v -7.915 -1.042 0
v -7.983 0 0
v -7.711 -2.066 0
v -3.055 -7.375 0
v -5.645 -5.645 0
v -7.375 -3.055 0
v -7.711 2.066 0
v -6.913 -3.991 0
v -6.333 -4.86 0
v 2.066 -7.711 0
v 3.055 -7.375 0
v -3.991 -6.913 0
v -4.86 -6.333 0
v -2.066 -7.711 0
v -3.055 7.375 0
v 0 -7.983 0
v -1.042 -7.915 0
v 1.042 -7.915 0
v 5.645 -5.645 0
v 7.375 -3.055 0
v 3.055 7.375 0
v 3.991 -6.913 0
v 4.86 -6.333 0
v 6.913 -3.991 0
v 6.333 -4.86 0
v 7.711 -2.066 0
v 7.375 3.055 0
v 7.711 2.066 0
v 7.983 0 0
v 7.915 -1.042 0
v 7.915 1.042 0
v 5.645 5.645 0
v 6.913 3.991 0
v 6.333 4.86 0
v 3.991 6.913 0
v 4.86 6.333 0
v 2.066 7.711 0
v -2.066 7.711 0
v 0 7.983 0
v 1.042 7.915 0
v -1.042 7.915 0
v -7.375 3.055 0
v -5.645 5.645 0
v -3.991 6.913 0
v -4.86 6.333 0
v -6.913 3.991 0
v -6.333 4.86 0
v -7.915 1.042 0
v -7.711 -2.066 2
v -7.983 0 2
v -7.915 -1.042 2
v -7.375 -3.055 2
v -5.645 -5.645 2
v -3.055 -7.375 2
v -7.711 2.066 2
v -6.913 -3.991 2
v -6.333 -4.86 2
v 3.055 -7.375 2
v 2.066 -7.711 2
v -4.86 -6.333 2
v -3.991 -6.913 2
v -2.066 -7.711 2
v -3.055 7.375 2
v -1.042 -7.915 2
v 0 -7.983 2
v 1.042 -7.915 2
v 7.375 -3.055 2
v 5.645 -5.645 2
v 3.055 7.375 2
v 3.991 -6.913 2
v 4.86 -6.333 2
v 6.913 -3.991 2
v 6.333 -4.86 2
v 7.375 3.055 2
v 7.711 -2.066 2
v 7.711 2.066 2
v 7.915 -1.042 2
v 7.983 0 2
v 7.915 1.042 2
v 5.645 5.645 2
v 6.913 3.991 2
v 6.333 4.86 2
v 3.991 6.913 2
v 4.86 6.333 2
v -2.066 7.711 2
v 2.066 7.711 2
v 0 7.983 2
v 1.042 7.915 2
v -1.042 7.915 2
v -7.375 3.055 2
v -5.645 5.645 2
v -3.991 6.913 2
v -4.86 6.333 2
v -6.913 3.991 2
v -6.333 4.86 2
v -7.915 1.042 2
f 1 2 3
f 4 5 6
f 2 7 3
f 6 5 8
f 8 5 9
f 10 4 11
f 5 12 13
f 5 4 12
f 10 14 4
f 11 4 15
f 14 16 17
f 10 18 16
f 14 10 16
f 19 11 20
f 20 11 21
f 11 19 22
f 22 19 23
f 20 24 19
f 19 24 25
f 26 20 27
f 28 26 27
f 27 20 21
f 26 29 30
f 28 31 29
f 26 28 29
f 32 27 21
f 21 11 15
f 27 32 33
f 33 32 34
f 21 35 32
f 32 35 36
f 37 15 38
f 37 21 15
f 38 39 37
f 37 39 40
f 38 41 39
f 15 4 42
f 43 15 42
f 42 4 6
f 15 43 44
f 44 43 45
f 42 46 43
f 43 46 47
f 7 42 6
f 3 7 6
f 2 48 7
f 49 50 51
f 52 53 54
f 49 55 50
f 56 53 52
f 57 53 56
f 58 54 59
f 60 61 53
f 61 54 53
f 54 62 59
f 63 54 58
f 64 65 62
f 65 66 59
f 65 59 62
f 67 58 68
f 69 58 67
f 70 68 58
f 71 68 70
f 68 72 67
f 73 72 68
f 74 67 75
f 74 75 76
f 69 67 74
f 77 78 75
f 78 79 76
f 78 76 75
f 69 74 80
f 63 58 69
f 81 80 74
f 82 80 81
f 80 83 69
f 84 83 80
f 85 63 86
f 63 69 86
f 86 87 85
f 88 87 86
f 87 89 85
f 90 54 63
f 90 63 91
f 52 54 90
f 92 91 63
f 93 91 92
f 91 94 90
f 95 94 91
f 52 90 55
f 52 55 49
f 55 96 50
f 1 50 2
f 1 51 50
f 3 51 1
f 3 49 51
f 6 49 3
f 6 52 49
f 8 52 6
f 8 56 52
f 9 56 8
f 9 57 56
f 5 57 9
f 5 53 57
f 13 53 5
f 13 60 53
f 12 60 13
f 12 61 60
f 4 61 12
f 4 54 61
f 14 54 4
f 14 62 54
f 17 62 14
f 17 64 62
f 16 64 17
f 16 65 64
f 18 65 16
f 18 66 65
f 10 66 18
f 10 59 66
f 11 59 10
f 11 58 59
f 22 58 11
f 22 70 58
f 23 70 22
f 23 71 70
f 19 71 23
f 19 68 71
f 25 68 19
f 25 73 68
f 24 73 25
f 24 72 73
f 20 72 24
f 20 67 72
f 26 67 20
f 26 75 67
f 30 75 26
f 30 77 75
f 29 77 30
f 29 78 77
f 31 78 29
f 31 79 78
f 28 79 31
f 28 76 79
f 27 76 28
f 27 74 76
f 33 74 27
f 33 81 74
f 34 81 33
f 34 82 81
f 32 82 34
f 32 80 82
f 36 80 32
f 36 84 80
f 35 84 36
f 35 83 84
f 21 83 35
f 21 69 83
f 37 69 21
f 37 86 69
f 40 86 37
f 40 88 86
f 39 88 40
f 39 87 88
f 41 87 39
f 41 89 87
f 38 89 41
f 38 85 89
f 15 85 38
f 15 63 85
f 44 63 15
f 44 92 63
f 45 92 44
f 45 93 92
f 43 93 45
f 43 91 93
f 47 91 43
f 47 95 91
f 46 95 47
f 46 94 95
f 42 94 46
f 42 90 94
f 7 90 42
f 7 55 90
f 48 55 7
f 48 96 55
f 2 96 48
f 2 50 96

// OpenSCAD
linear_extrude(2) hull() projection(cut=true) sphere(8,$fn=48);
